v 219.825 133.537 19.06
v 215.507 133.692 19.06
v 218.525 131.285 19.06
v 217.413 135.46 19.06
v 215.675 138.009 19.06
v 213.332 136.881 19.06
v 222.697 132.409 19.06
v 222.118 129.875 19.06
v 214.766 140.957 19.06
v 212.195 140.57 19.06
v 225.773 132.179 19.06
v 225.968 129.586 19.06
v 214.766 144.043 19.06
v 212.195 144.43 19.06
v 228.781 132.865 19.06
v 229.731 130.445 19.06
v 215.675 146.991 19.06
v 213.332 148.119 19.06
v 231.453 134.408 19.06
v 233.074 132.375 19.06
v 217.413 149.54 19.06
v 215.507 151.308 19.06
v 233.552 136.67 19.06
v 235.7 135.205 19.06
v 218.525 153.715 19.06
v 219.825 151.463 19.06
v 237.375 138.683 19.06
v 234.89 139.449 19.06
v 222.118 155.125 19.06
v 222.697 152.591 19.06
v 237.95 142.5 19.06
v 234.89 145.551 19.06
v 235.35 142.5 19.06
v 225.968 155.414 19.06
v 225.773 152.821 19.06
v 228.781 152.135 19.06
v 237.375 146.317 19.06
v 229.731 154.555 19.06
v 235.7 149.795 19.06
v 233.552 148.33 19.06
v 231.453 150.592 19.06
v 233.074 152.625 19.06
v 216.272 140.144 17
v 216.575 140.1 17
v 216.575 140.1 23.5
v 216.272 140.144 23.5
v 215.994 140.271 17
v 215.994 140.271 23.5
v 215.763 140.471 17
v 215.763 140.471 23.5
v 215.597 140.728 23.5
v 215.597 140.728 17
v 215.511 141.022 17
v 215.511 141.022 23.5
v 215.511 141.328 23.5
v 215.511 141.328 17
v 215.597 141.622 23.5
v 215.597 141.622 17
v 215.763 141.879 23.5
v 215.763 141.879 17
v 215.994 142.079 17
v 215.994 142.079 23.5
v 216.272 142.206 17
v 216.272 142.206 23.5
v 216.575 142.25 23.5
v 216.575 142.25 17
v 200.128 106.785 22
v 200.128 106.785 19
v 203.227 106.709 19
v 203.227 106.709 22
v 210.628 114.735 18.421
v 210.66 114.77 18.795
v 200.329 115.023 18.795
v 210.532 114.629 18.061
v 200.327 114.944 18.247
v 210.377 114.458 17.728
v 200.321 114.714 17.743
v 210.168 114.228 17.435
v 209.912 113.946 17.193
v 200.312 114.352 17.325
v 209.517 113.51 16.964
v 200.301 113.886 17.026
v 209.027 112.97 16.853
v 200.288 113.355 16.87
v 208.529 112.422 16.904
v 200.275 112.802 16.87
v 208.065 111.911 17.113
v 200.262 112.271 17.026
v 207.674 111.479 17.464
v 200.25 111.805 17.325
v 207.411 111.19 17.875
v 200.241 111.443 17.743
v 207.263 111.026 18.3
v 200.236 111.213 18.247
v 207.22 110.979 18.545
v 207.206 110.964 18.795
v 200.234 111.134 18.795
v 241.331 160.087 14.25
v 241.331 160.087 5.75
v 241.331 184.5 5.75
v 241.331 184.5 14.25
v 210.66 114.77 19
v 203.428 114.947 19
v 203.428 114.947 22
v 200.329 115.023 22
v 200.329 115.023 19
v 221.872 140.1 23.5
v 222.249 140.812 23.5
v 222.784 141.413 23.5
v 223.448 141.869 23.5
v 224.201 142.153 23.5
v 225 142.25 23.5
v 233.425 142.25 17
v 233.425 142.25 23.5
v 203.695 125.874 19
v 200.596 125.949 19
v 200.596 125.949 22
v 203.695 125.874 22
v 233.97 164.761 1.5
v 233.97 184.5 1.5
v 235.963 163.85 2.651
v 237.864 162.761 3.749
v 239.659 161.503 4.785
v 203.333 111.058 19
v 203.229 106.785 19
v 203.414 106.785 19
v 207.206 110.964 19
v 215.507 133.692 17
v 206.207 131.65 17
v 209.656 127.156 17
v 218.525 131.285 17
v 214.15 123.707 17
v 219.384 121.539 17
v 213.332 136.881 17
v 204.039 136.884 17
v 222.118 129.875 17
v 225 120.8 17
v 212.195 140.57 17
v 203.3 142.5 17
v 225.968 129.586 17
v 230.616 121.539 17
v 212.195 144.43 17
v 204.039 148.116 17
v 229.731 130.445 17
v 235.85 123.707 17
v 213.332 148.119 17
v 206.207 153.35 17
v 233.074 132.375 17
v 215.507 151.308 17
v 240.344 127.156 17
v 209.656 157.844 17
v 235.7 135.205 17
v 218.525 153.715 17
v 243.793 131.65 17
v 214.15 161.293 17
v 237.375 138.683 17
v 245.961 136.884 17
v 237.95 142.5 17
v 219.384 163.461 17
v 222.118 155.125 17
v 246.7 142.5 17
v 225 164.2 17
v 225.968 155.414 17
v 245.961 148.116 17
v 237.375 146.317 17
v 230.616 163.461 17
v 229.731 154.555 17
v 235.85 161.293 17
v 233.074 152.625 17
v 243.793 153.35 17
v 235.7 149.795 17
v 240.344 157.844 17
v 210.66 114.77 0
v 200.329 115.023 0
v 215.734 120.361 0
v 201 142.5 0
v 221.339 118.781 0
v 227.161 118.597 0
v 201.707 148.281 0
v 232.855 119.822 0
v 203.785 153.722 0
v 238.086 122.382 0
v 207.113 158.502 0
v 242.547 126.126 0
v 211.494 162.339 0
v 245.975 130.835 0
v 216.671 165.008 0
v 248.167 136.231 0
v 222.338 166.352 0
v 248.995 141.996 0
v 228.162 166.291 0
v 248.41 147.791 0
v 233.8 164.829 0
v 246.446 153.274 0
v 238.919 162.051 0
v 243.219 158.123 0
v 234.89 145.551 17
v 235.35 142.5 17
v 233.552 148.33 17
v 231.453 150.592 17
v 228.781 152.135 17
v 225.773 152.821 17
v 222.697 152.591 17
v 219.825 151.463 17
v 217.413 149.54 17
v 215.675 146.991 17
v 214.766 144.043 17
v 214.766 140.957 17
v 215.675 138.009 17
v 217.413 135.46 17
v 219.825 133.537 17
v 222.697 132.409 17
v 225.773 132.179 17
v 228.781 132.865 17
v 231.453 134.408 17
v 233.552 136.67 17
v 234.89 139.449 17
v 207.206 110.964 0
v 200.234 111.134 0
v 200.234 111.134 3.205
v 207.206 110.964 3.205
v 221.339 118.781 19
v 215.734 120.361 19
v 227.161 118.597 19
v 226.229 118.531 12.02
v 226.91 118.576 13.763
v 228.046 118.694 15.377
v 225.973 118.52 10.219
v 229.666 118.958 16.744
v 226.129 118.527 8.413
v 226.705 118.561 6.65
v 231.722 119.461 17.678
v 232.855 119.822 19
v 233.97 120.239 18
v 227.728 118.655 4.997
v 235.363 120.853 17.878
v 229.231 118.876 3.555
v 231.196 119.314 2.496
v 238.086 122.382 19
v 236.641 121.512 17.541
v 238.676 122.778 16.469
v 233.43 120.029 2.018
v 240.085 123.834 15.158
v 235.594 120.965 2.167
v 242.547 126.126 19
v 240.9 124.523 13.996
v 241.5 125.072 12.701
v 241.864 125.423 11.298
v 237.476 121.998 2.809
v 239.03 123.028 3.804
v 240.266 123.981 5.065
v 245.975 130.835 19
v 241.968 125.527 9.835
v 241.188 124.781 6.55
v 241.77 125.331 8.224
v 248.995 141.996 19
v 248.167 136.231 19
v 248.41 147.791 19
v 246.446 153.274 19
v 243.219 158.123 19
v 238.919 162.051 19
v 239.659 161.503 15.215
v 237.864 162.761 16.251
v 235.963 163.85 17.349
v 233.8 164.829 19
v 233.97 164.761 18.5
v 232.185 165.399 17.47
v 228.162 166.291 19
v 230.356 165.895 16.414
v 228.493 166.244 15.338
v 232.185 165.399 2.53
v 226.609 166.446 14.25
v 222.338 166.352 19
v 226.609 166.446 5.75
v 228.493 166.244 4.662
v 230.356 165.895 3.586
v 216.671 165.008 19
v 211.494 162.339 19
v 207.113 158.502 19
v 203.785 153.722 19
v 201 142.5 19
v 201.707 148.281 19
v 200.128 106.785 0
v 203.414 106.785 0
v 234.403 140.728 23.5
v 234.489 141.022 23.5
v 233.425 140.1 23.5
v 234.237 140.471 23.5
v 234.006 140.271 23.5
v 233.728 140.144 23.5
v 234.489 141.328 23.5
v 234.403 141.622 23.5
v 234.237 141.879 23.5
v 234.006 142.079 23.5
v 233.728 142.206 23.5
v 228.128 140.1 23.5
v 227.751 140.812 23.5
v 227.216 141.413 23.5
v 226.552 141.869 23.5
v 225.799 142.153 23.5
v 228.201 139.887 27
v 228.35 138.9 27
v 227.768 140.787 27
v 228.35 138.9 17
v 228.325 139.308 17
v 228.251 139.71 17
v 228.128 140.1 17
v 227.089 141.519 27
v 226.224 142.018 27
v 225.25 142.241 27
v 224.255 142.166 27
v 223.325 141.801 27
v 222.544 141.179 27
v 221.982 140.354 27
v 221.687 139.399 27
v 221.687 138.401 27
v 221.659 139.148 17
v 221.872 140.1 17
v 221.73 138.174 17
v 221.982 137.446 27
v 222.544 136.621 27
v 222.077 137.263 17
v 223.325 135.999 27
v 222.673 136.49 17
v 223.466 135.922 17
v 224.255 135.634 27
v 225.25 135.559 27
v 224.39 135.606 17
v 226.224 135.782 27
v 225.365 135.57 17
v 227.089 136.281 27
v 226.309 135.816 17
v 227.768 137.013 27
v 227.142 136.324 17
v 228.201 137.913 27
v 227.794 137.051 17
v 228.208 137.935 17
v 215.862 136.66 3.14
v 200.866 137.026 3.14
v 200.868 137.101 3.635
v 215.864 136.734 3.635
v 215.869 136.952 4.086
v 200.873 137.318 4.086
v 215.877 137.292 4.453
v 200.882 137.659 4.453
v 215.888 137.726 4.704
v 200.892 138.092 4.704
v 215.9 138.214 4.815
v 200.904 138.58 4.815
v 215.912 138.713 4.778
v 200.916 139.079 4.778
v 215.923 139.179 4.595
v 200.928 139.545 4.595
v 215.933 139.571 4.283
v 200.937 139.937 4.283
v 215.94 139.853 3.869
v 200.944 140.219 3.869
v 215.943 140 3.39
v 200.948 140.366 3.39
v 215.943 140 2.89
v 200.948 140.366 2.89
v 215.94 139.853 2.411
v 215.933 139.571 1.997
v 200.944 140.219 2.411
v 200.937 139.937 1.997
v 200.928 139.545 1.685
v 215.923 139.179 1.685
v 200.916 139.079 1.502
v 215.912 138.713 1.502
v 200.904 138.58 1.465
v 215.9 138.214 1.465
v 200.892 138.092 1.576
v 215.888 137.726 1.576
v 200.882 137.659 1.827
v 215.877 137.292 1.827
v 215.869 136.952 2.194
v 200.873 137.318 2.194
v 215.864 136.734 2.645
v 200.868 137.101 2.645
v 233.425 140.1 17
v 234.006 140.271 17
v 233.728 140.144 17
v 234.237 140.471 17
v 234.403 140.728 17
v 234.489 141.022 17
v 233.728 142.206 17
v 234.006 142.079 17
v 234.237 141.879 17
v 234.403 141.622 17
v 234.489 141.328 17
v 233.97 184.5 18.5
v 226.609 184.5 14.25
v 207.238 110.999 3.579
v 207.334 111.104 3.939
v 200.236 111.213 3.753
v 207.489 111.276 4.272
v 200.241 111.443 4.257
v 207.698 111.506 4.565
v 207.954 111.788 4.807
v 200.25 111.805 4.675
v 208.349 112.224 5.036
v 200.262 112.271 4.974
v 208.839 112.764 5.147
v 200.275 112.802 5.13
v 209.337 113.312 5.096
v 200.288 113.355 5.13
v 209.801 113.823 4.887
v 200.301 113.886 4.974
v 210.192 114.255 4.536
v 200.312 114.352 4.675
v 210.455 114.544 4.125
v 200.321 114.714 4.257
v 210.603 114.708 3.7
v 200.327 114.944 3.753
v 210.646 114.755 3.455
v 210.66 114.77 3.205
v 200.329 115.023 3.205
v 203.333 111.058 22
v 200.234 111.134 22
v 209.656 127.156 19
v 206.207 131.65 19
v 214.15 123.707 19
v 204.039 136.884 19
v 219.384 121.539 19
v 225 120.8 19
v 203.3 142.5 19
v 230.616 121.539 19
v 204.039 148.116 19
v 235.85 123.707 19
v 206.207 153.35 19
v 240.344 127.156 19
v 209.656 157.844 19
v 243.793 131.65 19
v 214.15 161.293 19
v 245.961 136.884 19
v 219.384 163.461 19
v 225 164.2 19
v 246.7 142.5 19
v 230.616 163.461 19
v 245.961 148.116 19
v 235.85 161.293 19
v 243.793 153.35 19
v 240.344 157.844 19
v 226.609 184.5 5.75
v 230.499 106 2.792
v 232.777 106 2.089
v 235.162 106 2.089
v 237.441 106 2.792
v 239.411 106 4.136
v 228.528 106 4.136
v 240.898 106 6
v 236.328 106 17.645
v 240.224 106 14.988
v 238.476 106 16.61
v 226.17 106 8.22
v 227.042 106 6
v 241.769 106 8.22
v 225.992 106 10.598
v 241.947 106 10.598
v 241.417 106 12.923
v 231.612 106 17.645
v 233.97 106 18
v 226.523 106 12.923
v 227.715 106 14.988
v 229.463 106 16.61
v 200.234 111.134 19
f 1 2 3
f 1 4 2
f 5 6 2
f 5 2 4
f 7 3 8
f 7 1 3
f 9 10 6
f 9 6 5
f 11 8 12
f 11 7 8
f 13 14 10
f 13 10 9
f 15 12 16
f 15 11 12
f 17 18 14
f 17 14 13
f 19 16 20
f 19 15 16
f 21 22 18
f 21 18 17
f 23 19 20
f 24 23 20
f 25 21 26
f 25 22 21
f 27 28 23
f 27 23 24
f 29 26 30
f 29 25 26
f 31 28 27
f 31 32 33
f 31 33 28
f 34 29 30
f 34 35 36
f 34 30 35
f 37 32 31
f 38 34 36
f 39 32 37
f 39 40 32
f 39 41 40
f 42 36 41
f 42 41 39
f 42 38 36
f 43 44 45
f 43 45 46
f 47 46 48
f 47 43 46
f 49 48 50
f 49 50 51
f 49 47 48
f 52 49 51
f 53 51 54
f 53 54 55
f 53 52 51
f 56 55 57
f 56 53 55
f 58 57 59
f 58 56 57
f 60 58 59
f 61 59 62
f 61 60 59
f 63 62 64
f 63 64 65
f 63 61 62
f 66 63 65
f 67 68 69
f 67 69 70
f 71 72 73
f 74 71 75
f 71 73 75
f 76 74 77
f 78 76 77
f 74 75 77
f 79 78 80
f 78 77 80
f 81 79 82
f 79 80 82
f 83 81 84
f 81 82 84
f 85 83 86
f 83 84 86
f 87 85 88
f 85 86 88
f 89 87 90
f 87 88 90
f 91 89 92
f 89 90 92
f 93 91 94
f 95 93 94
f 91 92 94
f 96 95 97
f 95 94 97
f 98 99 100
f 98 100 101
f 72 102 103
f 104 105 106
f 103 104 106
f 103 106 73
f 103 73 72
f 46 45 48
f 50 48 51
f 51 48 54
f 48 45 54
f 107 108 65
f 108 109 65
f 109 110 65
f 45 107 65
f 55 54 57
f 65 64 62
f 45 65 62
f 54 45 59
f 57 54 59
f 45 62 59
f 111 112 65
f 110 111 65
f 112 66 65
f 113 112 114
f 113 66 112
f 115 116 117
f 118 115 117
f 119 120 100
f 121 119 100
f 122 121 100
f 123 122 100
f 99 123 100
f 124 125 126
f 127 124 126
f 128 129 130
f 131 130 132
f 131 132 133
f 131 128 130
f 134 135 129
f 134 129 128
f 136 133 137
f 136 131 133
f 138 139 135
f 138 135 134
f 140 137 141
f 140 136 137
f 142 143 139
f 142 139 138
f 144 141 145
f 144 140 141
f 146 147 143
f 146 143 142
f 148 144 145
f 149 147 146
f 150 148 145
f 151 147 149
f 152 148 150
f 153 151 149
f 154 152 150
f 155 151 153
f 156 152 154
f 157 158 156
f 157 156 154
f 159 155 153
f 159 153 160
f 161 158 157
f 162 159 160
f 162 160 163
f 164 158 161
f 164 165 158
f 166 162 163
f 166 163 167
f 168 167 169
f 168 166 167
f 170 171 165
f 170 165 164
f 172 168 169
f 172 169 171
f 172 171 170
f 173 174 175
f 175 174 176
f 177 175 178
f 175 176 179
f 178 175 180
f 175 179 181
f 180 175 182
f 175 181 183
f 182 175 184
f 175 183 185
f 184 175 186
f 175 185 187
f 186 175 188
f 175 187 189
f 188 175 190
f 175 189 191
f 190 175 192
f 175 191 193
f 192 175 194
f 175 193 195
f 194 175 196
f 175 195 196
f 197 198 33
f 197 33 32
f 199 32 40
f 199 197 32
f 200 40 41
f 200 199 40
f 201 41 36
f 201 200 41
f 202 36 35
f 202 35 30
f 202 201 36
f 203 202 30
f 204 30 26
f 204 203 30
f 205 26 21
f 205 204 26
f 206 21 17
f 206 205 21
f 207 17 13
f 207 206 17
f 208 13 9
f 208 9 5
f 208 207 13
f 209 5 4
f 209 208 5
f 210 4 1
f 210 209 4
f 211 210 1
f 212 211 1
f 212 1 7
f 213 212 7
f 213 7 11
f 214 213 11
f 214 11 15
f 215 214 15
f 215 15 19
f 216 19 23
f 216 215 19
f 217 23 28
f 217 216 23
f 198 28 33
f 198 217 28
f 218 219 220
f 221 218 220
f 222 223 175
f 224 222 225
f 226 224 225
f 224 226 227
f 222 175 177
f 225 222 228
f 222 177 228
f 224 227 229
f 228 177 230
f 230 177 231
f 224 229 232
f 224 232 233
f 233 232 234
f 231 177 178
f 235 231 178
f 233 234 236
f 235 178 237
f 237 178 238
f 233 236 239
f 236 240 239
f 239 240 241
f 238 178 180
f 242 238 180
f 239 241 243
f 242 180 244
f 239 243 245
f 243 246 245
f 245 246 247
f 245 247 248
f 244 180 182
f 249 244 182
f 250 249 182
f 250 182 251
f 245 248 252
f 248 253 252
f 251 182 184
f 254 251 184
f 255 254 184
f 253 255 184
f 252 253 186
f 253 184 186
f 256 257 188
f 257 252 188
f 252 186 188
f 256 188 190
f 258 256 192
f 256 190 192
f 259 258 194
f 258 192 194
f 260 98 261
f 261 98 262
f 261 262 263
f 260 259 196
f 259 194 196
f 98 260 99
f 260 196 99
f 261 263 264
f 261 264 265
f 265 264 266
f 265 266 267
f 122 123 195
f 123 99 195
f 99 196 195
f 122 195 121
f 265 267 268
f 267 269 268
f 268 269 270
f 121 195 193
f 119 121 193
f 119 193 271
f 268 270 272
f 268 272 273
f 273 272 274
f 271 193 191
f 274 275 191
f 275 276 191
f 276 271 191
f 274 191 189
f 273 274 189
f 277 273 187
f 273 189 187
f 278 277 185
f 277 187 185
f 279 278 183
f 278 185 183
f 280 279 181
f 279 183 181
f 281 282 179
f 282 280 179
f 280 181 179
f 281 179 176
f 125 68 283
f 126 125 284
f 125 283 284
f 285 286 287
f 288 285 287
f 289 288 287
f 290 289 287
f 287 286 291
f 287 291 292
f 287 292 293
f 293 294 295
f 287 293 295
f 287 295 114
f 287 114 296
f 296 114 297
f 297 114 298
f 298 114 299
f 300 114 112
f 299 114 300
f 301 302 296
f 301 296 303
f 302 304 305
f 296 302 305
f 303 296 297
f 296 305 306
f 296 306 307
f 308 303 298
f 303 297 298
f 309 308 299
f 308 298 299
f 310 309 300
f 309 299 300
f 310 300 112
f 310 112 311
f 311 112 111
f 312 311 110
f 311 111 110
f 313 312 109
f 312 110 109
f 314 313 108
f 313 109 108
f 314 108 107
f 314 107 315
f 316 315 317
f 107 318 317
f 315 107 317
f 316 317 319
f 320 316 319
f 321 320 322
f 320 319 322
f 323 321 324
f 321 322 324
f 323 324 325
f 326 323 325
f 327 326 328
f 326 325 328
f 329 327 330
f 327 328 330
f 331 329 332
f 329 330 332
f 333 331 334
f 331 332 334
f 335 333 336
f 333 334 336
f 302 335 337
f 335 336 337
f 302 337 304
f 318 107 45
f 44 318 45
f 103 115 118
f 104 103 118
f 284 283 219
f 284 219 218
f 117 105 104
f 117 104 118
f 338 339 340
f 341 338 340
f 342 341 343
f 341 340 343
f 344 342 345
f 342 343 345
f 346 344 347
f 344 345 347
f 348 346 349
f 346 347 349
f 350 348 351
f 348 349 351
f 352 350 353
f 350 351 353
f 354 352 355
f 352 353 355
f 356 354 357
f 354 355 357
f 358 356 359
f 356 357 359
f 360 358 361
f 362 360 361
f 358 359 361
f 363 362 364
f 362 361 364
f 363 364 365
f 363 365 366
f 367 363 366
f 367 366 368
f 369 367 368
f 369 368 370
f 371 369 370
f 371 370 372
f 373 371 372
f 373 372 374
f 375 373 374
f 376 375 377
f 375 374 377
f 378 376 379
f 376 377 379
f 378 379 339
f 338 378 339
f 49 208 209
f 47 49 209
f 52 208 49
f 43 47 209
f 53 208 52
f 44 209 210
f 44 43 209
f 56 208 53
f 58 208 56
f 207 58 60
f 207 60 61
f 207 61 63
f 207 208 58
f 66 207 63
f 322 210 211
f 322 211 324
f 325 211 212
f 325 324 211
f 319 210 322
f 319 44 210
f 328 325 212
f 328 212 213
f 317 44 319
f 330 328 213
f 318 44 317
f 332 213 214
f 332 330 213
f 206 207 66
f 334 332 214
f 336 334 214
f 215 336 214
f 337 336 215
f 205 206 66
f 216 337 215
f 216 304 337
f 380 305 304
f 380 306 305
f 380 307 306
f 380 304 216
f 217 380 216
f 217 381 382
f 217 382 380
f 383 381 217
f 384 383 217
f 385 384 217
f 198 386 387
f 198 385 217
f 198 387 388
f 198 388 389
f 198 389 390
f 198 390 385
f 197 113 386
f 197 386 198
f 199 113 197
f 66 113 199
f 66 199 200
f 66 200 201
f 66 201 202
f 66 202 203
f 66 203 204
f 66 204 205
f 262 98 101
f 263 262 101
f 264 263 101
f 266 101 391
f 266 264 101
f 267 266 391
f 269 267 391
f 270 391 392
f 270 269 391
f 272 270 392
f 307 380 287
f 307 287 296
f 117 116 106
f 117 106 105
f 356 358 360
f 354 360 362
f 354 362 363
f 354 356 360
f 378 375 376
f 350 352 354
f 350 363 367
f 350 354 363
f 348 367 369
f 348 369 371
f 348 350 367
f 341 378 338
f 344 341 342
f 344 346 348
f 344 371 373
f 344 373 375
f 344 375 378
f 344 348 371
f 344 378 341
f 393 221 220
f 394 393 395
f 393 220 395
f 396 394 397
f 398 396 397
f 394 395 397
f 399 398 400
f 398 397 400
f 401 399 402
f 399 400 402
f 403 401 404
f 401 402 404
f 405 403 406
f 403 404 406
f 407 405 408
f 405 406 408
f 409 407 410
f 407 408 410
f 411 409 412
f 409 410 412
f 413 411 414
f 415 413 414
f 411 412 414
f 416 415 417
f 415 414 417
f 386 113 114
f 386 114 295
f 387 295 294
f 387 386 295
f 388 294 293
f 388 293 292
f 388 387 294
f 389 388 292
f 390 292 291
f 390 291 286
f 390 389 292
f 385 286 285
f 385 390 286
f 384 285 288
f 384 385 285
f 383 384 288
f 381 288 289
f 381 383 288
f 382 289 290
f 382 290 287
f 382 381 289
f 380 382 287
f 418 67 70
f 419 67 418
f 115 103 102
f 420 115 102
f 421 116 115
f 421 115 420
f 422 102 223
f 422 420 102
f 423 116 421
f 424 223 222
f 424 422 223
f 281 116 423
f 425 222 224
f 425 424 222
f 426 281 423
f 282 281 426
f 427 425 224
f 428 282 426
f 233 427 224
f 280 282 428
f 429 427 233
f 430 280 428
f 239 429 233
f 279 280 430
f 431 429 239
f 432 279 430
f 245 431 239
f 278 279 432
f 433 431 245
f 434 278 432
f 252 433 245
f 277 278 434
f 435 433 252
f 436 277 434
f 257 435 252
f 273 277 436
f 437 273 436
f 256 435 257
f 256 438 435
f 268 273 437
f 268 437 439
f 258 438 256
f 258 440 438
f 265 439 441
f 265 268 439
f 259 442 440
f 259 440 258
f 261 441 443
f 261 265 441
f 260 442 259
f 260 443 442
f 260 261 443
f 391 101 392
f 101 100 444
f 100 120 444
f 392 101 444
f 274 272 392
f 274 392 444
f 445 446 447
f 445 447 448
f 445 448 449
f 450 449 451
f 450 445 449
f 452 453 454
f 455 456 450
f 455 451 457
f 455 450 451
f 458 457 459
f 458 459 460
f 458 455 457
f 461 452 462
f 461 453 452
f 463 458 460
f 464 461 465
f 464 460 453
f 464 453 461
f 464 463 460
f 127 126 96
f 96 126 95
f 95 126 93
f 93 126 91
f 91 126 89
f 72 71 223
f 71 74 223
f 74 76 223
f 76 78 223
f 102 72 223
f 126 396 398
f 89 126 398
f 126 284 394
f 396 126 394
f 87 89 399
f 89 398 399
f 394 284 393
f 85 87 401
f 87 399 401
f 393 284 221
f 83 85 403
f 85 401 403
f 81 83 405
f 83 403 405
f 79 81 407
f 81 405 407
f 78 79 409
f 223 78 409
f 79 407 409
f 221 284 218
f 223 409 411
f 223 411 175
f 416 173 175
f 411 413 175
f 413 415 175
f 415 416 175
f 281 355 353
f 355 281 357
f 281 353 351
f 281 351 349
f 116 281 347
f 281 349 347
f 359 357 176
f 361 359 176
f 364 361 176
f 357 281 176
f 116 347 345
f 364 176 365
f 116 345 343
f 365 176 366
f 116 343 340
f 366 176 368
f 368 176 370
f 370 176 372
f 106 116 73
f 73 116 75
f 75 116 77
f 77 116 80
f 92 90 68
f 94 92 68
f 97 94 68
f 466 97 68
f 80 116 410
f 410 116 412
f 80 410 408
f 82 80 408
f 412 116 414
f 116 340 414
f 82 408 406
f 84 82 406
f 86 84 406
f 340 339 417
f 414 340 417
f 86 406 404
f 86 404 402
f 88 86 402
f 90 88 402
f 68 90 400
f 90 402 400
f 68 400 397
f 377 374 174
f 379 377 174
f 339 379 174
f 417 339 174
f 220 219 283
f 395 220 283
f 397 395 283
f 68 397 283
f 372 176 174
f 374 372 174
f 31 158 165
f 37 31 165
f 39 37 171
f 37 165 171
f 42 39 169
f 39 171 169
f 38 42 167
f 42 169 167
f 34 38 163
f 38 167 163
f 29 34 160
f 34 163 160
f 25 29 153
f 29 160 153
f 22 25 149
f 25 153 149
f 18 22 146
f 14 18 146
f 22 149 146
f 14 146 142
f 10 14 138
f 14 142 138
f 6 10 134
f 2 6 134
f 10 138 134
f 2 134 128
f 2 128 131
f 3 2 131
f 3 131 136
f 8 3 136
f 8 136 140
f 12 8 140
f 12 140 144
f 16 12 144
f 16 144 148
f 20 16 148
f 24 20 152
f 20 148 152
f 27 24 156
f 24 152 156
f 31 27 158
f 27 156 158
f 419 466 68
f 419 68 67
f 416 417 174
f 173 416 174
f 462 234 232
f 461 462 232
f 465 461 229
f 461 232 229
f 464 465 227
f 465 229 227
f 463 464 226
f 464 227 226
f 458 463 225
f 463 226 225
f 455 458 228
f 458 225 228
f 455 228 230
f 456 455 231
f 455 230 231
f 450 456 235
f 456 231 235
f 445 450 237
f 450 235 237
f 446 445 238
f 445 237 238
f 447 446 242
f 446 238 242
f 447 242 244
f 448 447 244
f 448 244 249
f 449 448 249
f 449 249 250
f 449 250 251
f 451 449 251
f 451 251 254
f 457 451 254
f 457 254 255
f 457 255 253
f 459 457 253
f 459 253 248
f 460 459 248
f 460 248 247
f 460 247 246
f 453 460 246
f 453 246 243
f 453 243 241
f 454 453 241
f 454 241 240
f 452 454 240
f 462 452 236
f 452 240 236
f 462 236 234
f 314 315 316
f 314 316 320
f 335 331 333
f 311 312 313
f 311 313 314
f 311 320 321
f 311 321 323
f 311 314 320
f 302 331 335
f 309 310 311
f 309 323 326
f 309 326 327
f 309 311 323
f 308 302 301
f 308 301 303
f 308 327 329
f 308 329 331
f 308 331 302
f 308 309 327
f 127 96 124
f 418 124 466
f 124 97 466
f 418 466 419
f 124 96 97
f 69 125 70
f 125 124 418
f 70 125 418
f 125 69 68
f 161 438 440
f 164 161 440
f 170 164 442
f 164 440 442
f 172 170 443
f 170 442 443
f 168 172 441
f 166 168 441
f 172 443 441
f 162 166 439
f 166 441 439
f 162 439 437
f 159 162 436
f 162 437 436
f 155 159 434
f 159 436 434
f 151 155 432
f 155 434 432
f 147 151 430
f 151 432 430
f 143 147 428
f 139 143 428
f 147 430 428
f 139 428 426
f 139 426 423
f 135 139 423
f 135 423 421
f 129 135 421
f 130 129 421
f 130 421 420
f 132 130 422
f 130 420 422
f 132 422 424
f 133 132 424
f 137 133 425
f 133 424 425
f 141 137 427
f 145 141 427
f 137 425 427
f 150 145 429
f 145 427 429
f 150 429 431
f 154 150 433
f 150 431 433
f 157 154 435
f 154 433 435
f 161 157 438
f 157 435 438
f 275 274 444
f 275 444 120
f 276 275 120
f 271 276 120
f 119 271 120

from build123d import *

# Parameters (mm, degrees)
SKETCH3_R           = 24
BOSS_EXTRUDE1_DEPTH = 19
BOSS_EXTRUDE2_DEPTH = 19
SKETCH7_R           = 8
BOSS_EXTRUDE3_DEPTH = 22.5
BOSS_EXTRUDE4_DEPTH = 26
SKETCH9_W           = 3
SKETCH9_H           = 19.17
BOSS_EXTRUDE5_DEPTH = 3.1
SKETCH10_R          = 1.68
CUT_EXTRUDE1_DEPTH  = 15
SKETCH11_R          = 21.7
CUT_EXTRUDE2_DEPTH  = 2
SKETCH12_R          = 12.95
SKETCH12_R_2        = 10.35
BOSS_EXTRUDE6_DEPTH = 2.06
SKETCH13_R          = 3.35
BOSS_EXTRUDE7_DEPTH = 10
BOSS_EXTRUDE8_DEPTH = 6.5


with BuildPart() as part:
    # Sketch3 → Boss-Extrude1 (new body)
    with BuildSketch(Plane.XY):
        with Locations((225, 142.5)):
            Circle(SKETCH3_R)
    extrude(amount=BOSS_EXTRUDE1_DEPTH)

    # Sketch5 → Boss-Extrude2 (add)
    with BuildSketch(Plane.XY):
        with BuildLine():
            Line((201, 142.5), (200.127626755, 106.785172639))
            Line((200.127626755, 106.785172639), (203.414220338, 106.785172639))
            Line((203.414220338, 106.785172639), (215.733540757, 120.361058447))
            ThreePointArc((215.733540757, 120.361058447), (205.020072299, 129.203290291), (201, 142.5))
        make_face()
    extrude(amount=BOSS_EXTRUDE2_DEPTH)

    # Sketch7 → Boss-Extrude3 (add)
    with BuildSketch(Plane(origin=(0, 128.5, 0), x_dir=(-1, 0, 0), z_dir=(0, -1, 0))):
        with Locations((-233.969805688, -10)):
            Circle(SKETCH7_R)
    extrude(amount=BOSS_EXTRUDE3_DEPTH)

    # Sketch8 → Boss-Extrude4 (add)
    with BuildSketch(Plane(origin=(0, 158.5, 0), x_dir=(-1, 0, 0), z_dir=(0, -1, 0))):
        Polygon((-241.33102162, -5.75), (-241.33102162, -14.25), (-233.969805688, -18.5), (-226.608589756, -14.25), (-226.608589756, -5.75), (-233.969805688, -1.5), align=None)
    extrude(amount=-BOSS_EXTRUDE4_DEPTH)

    # Sketch9 → Boss-Extrude5 (add)
    with BuildSketch(Plane(origin=(197.401507206, -4.821745091, 0), x_dir=(0, 0, 1), z_dir=(-0.999701816720525, 0.024418796974499463, 0))):
        with Locations((20.5, 121.225206973)):
            Rectangle(SKETCH9_W, SKETCH9_H)
    extrude(amount=-BOSS_EXTRUDE5_DEPTH)

    # Sketch10 → Cut-Extrude1 (cut)
    with BuildSketch(Plane(origin=(197.401507206, -4.821745091, 0), x_dir=(0, 0, 1), z_dir=(-0.9997018167205249, 0.02441879697449946, 0))):
        with Locations((3.14, 143.570206973)):
            Circle(SKETCH10_R)
        with BuildLine():
            Line((0, 119.880206973), (0, 115.990206973))
            Line((0, 115.990206973), (3.205, 115.990206973))
            ThreePointArc((3.205, 115.990206973), (5.15, 117.935206973), (3.205, 119.880206973))
            Line((3.205, 119.880206973), (0, 119.880206973))
        make_face()
        with BuildLine():
            Line((22, 115.990206973), (22, 119.880206973))
            Line((22, 119.880206973), (18.795, 119.880206973))
            ThreePointArc((18.795, 119.880206973), (16.85, 117.935206973), (18.795, 115.990206973))
            Line((18.795, 115.990206973), (22, 115.990206973))
        make_face()
    extrude(amount=-CUT_EXTRUDE1_DEPTH, mode=Mode.SUBTRACT)

    # Sketch11 → Cut-Extrude2 (cut)
    with BuildSketch(Plane.XY.offset(19)):
        with Locations((225, 142.5)):
            Circle(SKETCH11_R)
    extrude(amount=-CUT_EXTRUDE2_DEPTH, mode=Mode.SUBTRACT)

    # Sketch12 → Boss-Extrude6 (add)
    with BuildSketch(Plane.XY.offset(17)):
        with Locations((225, 142.5)):
            Circle(SKETCH12_R)
        with Locations((225, 142.5)):
            Circle(SKETCH12_R_2, mode=Mode.SUBTRACT)
    extrude(amount=BOSS_EXTRUDE6_DEPTH)

    # Sketch13 → Boss-Extrude7 (add)
    with BuildSketch(Plane.XY.offset(17)):
        with Locations((225, 138.9)):
            Circle(SKETCH13_R)
    extrude(amount=BOSS_EXTRUDE7_DEPTH)

    # Sketch14 → Boss-Extrude8 (add)
    with BuildSketch(Plane.XY.offset(17)):
        with BuildLine():
            Line((216.575, 142.25), (233.425, 142.25))
            ThreePointArc((233.425, 142.25), (234.5, 141.175), (233.425, 140.1))
            Line((233.425, 140.1), (216.575, 140.1))
            ThreePointArc((216.575, 140.1), (215.5, 141.175), (216.575, 142.25))
        make_face()
    extrude(amount=BOSS_EXTRUDE8_DEPTH)


solid = part.part
